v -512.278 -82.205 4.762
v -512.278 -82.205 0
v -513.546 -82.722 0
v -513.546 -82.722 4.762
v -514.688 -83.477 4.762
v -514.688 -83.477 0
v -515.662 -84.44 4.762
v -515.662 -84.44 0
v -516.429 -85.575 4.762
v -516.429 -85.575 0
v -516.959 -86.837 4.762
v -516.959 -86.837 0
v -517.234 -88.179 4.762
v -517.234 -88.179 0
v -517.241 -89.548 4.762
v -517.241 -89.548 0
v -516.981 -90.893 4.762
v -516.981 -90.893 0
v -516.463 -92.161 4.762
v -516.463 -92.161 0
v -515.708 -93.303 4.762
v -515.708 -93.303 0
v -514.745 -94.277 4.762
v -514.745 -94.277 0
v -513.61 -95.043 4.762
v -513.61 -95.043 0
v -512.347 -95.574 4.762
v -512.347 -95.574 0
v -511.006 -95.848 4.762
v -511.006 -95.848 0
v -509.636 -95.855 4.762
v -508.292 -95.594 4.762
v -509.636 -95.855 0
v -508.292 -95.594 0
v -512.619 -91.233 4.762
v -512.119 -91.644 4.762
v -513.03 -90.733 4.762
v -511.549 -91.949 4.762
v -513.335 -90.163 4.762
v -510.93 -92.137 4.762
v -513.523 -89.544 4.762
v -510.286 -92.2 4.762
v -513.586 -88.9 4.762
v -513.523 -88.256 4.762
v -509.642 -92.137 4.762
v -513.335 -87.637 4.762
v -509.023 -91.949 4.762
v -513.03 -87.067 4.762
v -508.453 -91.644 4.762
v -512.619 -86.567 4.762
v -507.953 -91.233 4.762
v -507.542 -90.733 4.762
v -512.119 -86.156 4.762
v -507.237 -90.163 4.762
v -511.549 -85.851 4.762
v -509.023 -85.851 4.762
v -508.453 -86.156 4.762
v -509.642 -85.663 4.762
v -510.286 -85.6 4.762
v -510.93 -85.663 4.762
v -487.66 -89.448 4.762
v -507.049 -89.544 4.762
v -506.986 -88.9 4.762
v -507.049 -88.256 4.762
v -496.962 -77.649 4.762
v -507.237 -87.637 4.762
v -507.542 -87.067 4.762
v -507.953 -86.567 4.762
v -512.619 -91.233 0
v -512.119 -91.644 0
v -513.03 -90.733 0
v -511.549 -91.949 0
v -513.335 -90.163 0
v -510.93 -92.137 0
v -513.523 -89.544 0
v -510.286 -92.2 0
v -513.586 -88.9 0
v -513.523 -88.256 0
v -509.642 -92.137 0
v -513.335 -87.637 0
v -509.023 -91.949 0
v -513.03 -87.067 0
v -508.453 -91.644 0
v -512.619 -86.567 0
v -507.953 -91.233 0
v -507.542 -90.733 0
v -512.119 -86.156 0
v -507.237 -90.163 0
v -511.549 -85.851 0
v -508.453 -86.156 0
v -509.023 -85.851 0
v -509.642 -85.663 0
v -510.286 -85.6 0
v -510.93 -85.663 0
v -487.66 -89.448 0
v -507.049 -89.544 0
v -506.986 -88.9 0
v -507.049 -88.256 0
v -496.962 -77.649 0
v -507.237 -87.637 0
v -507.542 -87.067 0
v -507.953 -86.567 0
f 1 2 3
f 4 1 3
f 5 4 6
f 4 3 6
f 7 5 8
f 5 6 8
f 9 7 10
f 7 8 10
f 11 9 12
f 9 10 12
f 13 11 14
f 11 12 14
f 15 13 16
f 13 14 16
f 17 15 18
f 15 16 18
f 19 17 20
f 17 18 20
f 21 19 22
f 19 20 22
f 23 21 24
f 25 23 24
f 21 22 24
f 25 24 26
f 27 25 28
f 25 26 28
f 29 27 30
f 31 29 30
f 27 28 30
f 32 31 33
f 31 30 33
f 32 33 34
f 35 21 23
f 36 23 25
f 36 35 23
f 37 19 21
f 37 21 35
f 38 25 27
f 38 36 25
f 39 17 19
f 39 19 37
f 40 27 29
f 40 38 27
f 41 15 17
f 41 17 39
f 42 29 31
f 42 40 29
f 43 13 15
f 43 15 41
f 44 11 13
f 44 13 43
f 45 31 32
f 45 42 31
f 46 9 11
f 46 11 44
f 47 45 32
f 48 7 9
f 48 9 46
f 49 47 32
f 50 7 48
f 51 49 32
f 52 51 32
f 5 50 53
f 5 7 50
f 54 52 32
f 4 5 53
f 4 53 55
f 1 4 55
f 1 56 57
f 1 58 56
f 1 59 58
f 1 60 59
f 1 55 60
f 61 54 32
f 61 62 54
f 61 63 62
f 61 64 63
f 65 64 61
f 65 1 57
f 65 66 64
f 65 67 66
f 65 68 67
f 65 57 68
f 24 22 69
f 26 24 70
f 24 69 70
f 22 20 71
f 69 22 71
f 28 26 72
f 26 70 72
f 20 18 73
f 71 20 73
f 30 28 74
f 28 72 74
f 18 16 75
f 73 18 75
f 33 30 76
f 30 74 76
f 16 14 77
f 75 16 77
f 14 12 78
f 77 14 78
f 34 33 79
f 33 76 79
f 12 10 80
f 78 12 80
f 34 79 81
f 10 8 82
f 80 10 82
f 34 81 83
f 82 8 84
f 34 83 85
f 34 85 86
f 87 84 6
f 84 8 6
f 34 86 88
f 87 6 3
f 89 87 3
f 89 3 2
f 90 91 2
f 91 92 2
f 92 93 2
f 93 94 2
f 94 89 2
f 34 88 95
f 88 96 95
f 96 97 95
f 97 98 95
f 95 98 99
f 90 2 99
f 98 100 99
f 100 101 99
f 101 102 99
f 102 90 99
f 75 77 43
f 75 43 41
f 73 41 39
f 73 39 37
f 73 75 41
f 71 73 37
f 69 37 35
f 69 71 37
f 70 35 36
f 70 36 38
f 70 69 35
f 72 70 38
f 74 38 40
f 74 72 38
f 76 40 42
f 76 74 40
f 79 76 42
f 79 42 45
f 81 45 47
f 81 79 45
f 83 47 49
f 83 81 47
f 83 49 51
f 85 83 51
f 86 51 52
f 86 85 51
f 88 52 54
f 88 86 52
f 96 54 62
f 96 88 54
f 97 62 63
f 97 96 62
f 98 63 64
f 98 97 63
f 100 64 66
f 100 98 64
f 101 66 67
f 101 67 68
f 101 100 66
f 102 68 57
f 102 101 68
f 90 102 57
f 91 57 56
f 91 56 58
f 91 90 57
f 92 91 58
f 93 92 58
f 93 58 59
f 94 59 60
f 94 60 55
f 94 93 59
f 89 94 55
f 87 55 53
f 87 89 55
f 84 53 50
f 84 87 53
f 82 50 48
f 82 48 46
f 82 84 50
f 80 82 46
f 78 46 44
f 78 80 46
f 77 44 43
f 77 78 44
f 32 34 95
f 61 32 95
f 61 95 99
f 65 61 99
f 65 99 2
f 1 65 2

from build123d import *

# Parameters (mm, degrees)
SKETCH1_R           = 3.3
BOSS_EXTRUDE1_DEPTH = 4.7625


with BuildPart() as part:
    # Sketch1 → Boss-Extrude1 (new body)
    with BuildSketch(Plane.XY):
        with BuildLine():
            Line((-508.291723206, -95.594257619), (-487.660025711, -89.447897876))
            Line((-487.660025711, -89.447897876), (-496.962426186, -77.649232083))
            Line((-496.962426186, -77.649232083), (-512.277542982, -82.204928563))
            ThreePointArc((-512.277542982, -82.204928563), (-516.980664668, -90.89290993), (-508.291723206, -95.594257619))
        make_face()
        with Locations(Location((-510.286, -88.9, 0), (0, 0, 180))):
            Circle(SKETCH1_R, mode=Mode.SUBTRACT)
    extrude(amount=BOSS_EXTRUDE1_DEPTH)


solid = part.part
